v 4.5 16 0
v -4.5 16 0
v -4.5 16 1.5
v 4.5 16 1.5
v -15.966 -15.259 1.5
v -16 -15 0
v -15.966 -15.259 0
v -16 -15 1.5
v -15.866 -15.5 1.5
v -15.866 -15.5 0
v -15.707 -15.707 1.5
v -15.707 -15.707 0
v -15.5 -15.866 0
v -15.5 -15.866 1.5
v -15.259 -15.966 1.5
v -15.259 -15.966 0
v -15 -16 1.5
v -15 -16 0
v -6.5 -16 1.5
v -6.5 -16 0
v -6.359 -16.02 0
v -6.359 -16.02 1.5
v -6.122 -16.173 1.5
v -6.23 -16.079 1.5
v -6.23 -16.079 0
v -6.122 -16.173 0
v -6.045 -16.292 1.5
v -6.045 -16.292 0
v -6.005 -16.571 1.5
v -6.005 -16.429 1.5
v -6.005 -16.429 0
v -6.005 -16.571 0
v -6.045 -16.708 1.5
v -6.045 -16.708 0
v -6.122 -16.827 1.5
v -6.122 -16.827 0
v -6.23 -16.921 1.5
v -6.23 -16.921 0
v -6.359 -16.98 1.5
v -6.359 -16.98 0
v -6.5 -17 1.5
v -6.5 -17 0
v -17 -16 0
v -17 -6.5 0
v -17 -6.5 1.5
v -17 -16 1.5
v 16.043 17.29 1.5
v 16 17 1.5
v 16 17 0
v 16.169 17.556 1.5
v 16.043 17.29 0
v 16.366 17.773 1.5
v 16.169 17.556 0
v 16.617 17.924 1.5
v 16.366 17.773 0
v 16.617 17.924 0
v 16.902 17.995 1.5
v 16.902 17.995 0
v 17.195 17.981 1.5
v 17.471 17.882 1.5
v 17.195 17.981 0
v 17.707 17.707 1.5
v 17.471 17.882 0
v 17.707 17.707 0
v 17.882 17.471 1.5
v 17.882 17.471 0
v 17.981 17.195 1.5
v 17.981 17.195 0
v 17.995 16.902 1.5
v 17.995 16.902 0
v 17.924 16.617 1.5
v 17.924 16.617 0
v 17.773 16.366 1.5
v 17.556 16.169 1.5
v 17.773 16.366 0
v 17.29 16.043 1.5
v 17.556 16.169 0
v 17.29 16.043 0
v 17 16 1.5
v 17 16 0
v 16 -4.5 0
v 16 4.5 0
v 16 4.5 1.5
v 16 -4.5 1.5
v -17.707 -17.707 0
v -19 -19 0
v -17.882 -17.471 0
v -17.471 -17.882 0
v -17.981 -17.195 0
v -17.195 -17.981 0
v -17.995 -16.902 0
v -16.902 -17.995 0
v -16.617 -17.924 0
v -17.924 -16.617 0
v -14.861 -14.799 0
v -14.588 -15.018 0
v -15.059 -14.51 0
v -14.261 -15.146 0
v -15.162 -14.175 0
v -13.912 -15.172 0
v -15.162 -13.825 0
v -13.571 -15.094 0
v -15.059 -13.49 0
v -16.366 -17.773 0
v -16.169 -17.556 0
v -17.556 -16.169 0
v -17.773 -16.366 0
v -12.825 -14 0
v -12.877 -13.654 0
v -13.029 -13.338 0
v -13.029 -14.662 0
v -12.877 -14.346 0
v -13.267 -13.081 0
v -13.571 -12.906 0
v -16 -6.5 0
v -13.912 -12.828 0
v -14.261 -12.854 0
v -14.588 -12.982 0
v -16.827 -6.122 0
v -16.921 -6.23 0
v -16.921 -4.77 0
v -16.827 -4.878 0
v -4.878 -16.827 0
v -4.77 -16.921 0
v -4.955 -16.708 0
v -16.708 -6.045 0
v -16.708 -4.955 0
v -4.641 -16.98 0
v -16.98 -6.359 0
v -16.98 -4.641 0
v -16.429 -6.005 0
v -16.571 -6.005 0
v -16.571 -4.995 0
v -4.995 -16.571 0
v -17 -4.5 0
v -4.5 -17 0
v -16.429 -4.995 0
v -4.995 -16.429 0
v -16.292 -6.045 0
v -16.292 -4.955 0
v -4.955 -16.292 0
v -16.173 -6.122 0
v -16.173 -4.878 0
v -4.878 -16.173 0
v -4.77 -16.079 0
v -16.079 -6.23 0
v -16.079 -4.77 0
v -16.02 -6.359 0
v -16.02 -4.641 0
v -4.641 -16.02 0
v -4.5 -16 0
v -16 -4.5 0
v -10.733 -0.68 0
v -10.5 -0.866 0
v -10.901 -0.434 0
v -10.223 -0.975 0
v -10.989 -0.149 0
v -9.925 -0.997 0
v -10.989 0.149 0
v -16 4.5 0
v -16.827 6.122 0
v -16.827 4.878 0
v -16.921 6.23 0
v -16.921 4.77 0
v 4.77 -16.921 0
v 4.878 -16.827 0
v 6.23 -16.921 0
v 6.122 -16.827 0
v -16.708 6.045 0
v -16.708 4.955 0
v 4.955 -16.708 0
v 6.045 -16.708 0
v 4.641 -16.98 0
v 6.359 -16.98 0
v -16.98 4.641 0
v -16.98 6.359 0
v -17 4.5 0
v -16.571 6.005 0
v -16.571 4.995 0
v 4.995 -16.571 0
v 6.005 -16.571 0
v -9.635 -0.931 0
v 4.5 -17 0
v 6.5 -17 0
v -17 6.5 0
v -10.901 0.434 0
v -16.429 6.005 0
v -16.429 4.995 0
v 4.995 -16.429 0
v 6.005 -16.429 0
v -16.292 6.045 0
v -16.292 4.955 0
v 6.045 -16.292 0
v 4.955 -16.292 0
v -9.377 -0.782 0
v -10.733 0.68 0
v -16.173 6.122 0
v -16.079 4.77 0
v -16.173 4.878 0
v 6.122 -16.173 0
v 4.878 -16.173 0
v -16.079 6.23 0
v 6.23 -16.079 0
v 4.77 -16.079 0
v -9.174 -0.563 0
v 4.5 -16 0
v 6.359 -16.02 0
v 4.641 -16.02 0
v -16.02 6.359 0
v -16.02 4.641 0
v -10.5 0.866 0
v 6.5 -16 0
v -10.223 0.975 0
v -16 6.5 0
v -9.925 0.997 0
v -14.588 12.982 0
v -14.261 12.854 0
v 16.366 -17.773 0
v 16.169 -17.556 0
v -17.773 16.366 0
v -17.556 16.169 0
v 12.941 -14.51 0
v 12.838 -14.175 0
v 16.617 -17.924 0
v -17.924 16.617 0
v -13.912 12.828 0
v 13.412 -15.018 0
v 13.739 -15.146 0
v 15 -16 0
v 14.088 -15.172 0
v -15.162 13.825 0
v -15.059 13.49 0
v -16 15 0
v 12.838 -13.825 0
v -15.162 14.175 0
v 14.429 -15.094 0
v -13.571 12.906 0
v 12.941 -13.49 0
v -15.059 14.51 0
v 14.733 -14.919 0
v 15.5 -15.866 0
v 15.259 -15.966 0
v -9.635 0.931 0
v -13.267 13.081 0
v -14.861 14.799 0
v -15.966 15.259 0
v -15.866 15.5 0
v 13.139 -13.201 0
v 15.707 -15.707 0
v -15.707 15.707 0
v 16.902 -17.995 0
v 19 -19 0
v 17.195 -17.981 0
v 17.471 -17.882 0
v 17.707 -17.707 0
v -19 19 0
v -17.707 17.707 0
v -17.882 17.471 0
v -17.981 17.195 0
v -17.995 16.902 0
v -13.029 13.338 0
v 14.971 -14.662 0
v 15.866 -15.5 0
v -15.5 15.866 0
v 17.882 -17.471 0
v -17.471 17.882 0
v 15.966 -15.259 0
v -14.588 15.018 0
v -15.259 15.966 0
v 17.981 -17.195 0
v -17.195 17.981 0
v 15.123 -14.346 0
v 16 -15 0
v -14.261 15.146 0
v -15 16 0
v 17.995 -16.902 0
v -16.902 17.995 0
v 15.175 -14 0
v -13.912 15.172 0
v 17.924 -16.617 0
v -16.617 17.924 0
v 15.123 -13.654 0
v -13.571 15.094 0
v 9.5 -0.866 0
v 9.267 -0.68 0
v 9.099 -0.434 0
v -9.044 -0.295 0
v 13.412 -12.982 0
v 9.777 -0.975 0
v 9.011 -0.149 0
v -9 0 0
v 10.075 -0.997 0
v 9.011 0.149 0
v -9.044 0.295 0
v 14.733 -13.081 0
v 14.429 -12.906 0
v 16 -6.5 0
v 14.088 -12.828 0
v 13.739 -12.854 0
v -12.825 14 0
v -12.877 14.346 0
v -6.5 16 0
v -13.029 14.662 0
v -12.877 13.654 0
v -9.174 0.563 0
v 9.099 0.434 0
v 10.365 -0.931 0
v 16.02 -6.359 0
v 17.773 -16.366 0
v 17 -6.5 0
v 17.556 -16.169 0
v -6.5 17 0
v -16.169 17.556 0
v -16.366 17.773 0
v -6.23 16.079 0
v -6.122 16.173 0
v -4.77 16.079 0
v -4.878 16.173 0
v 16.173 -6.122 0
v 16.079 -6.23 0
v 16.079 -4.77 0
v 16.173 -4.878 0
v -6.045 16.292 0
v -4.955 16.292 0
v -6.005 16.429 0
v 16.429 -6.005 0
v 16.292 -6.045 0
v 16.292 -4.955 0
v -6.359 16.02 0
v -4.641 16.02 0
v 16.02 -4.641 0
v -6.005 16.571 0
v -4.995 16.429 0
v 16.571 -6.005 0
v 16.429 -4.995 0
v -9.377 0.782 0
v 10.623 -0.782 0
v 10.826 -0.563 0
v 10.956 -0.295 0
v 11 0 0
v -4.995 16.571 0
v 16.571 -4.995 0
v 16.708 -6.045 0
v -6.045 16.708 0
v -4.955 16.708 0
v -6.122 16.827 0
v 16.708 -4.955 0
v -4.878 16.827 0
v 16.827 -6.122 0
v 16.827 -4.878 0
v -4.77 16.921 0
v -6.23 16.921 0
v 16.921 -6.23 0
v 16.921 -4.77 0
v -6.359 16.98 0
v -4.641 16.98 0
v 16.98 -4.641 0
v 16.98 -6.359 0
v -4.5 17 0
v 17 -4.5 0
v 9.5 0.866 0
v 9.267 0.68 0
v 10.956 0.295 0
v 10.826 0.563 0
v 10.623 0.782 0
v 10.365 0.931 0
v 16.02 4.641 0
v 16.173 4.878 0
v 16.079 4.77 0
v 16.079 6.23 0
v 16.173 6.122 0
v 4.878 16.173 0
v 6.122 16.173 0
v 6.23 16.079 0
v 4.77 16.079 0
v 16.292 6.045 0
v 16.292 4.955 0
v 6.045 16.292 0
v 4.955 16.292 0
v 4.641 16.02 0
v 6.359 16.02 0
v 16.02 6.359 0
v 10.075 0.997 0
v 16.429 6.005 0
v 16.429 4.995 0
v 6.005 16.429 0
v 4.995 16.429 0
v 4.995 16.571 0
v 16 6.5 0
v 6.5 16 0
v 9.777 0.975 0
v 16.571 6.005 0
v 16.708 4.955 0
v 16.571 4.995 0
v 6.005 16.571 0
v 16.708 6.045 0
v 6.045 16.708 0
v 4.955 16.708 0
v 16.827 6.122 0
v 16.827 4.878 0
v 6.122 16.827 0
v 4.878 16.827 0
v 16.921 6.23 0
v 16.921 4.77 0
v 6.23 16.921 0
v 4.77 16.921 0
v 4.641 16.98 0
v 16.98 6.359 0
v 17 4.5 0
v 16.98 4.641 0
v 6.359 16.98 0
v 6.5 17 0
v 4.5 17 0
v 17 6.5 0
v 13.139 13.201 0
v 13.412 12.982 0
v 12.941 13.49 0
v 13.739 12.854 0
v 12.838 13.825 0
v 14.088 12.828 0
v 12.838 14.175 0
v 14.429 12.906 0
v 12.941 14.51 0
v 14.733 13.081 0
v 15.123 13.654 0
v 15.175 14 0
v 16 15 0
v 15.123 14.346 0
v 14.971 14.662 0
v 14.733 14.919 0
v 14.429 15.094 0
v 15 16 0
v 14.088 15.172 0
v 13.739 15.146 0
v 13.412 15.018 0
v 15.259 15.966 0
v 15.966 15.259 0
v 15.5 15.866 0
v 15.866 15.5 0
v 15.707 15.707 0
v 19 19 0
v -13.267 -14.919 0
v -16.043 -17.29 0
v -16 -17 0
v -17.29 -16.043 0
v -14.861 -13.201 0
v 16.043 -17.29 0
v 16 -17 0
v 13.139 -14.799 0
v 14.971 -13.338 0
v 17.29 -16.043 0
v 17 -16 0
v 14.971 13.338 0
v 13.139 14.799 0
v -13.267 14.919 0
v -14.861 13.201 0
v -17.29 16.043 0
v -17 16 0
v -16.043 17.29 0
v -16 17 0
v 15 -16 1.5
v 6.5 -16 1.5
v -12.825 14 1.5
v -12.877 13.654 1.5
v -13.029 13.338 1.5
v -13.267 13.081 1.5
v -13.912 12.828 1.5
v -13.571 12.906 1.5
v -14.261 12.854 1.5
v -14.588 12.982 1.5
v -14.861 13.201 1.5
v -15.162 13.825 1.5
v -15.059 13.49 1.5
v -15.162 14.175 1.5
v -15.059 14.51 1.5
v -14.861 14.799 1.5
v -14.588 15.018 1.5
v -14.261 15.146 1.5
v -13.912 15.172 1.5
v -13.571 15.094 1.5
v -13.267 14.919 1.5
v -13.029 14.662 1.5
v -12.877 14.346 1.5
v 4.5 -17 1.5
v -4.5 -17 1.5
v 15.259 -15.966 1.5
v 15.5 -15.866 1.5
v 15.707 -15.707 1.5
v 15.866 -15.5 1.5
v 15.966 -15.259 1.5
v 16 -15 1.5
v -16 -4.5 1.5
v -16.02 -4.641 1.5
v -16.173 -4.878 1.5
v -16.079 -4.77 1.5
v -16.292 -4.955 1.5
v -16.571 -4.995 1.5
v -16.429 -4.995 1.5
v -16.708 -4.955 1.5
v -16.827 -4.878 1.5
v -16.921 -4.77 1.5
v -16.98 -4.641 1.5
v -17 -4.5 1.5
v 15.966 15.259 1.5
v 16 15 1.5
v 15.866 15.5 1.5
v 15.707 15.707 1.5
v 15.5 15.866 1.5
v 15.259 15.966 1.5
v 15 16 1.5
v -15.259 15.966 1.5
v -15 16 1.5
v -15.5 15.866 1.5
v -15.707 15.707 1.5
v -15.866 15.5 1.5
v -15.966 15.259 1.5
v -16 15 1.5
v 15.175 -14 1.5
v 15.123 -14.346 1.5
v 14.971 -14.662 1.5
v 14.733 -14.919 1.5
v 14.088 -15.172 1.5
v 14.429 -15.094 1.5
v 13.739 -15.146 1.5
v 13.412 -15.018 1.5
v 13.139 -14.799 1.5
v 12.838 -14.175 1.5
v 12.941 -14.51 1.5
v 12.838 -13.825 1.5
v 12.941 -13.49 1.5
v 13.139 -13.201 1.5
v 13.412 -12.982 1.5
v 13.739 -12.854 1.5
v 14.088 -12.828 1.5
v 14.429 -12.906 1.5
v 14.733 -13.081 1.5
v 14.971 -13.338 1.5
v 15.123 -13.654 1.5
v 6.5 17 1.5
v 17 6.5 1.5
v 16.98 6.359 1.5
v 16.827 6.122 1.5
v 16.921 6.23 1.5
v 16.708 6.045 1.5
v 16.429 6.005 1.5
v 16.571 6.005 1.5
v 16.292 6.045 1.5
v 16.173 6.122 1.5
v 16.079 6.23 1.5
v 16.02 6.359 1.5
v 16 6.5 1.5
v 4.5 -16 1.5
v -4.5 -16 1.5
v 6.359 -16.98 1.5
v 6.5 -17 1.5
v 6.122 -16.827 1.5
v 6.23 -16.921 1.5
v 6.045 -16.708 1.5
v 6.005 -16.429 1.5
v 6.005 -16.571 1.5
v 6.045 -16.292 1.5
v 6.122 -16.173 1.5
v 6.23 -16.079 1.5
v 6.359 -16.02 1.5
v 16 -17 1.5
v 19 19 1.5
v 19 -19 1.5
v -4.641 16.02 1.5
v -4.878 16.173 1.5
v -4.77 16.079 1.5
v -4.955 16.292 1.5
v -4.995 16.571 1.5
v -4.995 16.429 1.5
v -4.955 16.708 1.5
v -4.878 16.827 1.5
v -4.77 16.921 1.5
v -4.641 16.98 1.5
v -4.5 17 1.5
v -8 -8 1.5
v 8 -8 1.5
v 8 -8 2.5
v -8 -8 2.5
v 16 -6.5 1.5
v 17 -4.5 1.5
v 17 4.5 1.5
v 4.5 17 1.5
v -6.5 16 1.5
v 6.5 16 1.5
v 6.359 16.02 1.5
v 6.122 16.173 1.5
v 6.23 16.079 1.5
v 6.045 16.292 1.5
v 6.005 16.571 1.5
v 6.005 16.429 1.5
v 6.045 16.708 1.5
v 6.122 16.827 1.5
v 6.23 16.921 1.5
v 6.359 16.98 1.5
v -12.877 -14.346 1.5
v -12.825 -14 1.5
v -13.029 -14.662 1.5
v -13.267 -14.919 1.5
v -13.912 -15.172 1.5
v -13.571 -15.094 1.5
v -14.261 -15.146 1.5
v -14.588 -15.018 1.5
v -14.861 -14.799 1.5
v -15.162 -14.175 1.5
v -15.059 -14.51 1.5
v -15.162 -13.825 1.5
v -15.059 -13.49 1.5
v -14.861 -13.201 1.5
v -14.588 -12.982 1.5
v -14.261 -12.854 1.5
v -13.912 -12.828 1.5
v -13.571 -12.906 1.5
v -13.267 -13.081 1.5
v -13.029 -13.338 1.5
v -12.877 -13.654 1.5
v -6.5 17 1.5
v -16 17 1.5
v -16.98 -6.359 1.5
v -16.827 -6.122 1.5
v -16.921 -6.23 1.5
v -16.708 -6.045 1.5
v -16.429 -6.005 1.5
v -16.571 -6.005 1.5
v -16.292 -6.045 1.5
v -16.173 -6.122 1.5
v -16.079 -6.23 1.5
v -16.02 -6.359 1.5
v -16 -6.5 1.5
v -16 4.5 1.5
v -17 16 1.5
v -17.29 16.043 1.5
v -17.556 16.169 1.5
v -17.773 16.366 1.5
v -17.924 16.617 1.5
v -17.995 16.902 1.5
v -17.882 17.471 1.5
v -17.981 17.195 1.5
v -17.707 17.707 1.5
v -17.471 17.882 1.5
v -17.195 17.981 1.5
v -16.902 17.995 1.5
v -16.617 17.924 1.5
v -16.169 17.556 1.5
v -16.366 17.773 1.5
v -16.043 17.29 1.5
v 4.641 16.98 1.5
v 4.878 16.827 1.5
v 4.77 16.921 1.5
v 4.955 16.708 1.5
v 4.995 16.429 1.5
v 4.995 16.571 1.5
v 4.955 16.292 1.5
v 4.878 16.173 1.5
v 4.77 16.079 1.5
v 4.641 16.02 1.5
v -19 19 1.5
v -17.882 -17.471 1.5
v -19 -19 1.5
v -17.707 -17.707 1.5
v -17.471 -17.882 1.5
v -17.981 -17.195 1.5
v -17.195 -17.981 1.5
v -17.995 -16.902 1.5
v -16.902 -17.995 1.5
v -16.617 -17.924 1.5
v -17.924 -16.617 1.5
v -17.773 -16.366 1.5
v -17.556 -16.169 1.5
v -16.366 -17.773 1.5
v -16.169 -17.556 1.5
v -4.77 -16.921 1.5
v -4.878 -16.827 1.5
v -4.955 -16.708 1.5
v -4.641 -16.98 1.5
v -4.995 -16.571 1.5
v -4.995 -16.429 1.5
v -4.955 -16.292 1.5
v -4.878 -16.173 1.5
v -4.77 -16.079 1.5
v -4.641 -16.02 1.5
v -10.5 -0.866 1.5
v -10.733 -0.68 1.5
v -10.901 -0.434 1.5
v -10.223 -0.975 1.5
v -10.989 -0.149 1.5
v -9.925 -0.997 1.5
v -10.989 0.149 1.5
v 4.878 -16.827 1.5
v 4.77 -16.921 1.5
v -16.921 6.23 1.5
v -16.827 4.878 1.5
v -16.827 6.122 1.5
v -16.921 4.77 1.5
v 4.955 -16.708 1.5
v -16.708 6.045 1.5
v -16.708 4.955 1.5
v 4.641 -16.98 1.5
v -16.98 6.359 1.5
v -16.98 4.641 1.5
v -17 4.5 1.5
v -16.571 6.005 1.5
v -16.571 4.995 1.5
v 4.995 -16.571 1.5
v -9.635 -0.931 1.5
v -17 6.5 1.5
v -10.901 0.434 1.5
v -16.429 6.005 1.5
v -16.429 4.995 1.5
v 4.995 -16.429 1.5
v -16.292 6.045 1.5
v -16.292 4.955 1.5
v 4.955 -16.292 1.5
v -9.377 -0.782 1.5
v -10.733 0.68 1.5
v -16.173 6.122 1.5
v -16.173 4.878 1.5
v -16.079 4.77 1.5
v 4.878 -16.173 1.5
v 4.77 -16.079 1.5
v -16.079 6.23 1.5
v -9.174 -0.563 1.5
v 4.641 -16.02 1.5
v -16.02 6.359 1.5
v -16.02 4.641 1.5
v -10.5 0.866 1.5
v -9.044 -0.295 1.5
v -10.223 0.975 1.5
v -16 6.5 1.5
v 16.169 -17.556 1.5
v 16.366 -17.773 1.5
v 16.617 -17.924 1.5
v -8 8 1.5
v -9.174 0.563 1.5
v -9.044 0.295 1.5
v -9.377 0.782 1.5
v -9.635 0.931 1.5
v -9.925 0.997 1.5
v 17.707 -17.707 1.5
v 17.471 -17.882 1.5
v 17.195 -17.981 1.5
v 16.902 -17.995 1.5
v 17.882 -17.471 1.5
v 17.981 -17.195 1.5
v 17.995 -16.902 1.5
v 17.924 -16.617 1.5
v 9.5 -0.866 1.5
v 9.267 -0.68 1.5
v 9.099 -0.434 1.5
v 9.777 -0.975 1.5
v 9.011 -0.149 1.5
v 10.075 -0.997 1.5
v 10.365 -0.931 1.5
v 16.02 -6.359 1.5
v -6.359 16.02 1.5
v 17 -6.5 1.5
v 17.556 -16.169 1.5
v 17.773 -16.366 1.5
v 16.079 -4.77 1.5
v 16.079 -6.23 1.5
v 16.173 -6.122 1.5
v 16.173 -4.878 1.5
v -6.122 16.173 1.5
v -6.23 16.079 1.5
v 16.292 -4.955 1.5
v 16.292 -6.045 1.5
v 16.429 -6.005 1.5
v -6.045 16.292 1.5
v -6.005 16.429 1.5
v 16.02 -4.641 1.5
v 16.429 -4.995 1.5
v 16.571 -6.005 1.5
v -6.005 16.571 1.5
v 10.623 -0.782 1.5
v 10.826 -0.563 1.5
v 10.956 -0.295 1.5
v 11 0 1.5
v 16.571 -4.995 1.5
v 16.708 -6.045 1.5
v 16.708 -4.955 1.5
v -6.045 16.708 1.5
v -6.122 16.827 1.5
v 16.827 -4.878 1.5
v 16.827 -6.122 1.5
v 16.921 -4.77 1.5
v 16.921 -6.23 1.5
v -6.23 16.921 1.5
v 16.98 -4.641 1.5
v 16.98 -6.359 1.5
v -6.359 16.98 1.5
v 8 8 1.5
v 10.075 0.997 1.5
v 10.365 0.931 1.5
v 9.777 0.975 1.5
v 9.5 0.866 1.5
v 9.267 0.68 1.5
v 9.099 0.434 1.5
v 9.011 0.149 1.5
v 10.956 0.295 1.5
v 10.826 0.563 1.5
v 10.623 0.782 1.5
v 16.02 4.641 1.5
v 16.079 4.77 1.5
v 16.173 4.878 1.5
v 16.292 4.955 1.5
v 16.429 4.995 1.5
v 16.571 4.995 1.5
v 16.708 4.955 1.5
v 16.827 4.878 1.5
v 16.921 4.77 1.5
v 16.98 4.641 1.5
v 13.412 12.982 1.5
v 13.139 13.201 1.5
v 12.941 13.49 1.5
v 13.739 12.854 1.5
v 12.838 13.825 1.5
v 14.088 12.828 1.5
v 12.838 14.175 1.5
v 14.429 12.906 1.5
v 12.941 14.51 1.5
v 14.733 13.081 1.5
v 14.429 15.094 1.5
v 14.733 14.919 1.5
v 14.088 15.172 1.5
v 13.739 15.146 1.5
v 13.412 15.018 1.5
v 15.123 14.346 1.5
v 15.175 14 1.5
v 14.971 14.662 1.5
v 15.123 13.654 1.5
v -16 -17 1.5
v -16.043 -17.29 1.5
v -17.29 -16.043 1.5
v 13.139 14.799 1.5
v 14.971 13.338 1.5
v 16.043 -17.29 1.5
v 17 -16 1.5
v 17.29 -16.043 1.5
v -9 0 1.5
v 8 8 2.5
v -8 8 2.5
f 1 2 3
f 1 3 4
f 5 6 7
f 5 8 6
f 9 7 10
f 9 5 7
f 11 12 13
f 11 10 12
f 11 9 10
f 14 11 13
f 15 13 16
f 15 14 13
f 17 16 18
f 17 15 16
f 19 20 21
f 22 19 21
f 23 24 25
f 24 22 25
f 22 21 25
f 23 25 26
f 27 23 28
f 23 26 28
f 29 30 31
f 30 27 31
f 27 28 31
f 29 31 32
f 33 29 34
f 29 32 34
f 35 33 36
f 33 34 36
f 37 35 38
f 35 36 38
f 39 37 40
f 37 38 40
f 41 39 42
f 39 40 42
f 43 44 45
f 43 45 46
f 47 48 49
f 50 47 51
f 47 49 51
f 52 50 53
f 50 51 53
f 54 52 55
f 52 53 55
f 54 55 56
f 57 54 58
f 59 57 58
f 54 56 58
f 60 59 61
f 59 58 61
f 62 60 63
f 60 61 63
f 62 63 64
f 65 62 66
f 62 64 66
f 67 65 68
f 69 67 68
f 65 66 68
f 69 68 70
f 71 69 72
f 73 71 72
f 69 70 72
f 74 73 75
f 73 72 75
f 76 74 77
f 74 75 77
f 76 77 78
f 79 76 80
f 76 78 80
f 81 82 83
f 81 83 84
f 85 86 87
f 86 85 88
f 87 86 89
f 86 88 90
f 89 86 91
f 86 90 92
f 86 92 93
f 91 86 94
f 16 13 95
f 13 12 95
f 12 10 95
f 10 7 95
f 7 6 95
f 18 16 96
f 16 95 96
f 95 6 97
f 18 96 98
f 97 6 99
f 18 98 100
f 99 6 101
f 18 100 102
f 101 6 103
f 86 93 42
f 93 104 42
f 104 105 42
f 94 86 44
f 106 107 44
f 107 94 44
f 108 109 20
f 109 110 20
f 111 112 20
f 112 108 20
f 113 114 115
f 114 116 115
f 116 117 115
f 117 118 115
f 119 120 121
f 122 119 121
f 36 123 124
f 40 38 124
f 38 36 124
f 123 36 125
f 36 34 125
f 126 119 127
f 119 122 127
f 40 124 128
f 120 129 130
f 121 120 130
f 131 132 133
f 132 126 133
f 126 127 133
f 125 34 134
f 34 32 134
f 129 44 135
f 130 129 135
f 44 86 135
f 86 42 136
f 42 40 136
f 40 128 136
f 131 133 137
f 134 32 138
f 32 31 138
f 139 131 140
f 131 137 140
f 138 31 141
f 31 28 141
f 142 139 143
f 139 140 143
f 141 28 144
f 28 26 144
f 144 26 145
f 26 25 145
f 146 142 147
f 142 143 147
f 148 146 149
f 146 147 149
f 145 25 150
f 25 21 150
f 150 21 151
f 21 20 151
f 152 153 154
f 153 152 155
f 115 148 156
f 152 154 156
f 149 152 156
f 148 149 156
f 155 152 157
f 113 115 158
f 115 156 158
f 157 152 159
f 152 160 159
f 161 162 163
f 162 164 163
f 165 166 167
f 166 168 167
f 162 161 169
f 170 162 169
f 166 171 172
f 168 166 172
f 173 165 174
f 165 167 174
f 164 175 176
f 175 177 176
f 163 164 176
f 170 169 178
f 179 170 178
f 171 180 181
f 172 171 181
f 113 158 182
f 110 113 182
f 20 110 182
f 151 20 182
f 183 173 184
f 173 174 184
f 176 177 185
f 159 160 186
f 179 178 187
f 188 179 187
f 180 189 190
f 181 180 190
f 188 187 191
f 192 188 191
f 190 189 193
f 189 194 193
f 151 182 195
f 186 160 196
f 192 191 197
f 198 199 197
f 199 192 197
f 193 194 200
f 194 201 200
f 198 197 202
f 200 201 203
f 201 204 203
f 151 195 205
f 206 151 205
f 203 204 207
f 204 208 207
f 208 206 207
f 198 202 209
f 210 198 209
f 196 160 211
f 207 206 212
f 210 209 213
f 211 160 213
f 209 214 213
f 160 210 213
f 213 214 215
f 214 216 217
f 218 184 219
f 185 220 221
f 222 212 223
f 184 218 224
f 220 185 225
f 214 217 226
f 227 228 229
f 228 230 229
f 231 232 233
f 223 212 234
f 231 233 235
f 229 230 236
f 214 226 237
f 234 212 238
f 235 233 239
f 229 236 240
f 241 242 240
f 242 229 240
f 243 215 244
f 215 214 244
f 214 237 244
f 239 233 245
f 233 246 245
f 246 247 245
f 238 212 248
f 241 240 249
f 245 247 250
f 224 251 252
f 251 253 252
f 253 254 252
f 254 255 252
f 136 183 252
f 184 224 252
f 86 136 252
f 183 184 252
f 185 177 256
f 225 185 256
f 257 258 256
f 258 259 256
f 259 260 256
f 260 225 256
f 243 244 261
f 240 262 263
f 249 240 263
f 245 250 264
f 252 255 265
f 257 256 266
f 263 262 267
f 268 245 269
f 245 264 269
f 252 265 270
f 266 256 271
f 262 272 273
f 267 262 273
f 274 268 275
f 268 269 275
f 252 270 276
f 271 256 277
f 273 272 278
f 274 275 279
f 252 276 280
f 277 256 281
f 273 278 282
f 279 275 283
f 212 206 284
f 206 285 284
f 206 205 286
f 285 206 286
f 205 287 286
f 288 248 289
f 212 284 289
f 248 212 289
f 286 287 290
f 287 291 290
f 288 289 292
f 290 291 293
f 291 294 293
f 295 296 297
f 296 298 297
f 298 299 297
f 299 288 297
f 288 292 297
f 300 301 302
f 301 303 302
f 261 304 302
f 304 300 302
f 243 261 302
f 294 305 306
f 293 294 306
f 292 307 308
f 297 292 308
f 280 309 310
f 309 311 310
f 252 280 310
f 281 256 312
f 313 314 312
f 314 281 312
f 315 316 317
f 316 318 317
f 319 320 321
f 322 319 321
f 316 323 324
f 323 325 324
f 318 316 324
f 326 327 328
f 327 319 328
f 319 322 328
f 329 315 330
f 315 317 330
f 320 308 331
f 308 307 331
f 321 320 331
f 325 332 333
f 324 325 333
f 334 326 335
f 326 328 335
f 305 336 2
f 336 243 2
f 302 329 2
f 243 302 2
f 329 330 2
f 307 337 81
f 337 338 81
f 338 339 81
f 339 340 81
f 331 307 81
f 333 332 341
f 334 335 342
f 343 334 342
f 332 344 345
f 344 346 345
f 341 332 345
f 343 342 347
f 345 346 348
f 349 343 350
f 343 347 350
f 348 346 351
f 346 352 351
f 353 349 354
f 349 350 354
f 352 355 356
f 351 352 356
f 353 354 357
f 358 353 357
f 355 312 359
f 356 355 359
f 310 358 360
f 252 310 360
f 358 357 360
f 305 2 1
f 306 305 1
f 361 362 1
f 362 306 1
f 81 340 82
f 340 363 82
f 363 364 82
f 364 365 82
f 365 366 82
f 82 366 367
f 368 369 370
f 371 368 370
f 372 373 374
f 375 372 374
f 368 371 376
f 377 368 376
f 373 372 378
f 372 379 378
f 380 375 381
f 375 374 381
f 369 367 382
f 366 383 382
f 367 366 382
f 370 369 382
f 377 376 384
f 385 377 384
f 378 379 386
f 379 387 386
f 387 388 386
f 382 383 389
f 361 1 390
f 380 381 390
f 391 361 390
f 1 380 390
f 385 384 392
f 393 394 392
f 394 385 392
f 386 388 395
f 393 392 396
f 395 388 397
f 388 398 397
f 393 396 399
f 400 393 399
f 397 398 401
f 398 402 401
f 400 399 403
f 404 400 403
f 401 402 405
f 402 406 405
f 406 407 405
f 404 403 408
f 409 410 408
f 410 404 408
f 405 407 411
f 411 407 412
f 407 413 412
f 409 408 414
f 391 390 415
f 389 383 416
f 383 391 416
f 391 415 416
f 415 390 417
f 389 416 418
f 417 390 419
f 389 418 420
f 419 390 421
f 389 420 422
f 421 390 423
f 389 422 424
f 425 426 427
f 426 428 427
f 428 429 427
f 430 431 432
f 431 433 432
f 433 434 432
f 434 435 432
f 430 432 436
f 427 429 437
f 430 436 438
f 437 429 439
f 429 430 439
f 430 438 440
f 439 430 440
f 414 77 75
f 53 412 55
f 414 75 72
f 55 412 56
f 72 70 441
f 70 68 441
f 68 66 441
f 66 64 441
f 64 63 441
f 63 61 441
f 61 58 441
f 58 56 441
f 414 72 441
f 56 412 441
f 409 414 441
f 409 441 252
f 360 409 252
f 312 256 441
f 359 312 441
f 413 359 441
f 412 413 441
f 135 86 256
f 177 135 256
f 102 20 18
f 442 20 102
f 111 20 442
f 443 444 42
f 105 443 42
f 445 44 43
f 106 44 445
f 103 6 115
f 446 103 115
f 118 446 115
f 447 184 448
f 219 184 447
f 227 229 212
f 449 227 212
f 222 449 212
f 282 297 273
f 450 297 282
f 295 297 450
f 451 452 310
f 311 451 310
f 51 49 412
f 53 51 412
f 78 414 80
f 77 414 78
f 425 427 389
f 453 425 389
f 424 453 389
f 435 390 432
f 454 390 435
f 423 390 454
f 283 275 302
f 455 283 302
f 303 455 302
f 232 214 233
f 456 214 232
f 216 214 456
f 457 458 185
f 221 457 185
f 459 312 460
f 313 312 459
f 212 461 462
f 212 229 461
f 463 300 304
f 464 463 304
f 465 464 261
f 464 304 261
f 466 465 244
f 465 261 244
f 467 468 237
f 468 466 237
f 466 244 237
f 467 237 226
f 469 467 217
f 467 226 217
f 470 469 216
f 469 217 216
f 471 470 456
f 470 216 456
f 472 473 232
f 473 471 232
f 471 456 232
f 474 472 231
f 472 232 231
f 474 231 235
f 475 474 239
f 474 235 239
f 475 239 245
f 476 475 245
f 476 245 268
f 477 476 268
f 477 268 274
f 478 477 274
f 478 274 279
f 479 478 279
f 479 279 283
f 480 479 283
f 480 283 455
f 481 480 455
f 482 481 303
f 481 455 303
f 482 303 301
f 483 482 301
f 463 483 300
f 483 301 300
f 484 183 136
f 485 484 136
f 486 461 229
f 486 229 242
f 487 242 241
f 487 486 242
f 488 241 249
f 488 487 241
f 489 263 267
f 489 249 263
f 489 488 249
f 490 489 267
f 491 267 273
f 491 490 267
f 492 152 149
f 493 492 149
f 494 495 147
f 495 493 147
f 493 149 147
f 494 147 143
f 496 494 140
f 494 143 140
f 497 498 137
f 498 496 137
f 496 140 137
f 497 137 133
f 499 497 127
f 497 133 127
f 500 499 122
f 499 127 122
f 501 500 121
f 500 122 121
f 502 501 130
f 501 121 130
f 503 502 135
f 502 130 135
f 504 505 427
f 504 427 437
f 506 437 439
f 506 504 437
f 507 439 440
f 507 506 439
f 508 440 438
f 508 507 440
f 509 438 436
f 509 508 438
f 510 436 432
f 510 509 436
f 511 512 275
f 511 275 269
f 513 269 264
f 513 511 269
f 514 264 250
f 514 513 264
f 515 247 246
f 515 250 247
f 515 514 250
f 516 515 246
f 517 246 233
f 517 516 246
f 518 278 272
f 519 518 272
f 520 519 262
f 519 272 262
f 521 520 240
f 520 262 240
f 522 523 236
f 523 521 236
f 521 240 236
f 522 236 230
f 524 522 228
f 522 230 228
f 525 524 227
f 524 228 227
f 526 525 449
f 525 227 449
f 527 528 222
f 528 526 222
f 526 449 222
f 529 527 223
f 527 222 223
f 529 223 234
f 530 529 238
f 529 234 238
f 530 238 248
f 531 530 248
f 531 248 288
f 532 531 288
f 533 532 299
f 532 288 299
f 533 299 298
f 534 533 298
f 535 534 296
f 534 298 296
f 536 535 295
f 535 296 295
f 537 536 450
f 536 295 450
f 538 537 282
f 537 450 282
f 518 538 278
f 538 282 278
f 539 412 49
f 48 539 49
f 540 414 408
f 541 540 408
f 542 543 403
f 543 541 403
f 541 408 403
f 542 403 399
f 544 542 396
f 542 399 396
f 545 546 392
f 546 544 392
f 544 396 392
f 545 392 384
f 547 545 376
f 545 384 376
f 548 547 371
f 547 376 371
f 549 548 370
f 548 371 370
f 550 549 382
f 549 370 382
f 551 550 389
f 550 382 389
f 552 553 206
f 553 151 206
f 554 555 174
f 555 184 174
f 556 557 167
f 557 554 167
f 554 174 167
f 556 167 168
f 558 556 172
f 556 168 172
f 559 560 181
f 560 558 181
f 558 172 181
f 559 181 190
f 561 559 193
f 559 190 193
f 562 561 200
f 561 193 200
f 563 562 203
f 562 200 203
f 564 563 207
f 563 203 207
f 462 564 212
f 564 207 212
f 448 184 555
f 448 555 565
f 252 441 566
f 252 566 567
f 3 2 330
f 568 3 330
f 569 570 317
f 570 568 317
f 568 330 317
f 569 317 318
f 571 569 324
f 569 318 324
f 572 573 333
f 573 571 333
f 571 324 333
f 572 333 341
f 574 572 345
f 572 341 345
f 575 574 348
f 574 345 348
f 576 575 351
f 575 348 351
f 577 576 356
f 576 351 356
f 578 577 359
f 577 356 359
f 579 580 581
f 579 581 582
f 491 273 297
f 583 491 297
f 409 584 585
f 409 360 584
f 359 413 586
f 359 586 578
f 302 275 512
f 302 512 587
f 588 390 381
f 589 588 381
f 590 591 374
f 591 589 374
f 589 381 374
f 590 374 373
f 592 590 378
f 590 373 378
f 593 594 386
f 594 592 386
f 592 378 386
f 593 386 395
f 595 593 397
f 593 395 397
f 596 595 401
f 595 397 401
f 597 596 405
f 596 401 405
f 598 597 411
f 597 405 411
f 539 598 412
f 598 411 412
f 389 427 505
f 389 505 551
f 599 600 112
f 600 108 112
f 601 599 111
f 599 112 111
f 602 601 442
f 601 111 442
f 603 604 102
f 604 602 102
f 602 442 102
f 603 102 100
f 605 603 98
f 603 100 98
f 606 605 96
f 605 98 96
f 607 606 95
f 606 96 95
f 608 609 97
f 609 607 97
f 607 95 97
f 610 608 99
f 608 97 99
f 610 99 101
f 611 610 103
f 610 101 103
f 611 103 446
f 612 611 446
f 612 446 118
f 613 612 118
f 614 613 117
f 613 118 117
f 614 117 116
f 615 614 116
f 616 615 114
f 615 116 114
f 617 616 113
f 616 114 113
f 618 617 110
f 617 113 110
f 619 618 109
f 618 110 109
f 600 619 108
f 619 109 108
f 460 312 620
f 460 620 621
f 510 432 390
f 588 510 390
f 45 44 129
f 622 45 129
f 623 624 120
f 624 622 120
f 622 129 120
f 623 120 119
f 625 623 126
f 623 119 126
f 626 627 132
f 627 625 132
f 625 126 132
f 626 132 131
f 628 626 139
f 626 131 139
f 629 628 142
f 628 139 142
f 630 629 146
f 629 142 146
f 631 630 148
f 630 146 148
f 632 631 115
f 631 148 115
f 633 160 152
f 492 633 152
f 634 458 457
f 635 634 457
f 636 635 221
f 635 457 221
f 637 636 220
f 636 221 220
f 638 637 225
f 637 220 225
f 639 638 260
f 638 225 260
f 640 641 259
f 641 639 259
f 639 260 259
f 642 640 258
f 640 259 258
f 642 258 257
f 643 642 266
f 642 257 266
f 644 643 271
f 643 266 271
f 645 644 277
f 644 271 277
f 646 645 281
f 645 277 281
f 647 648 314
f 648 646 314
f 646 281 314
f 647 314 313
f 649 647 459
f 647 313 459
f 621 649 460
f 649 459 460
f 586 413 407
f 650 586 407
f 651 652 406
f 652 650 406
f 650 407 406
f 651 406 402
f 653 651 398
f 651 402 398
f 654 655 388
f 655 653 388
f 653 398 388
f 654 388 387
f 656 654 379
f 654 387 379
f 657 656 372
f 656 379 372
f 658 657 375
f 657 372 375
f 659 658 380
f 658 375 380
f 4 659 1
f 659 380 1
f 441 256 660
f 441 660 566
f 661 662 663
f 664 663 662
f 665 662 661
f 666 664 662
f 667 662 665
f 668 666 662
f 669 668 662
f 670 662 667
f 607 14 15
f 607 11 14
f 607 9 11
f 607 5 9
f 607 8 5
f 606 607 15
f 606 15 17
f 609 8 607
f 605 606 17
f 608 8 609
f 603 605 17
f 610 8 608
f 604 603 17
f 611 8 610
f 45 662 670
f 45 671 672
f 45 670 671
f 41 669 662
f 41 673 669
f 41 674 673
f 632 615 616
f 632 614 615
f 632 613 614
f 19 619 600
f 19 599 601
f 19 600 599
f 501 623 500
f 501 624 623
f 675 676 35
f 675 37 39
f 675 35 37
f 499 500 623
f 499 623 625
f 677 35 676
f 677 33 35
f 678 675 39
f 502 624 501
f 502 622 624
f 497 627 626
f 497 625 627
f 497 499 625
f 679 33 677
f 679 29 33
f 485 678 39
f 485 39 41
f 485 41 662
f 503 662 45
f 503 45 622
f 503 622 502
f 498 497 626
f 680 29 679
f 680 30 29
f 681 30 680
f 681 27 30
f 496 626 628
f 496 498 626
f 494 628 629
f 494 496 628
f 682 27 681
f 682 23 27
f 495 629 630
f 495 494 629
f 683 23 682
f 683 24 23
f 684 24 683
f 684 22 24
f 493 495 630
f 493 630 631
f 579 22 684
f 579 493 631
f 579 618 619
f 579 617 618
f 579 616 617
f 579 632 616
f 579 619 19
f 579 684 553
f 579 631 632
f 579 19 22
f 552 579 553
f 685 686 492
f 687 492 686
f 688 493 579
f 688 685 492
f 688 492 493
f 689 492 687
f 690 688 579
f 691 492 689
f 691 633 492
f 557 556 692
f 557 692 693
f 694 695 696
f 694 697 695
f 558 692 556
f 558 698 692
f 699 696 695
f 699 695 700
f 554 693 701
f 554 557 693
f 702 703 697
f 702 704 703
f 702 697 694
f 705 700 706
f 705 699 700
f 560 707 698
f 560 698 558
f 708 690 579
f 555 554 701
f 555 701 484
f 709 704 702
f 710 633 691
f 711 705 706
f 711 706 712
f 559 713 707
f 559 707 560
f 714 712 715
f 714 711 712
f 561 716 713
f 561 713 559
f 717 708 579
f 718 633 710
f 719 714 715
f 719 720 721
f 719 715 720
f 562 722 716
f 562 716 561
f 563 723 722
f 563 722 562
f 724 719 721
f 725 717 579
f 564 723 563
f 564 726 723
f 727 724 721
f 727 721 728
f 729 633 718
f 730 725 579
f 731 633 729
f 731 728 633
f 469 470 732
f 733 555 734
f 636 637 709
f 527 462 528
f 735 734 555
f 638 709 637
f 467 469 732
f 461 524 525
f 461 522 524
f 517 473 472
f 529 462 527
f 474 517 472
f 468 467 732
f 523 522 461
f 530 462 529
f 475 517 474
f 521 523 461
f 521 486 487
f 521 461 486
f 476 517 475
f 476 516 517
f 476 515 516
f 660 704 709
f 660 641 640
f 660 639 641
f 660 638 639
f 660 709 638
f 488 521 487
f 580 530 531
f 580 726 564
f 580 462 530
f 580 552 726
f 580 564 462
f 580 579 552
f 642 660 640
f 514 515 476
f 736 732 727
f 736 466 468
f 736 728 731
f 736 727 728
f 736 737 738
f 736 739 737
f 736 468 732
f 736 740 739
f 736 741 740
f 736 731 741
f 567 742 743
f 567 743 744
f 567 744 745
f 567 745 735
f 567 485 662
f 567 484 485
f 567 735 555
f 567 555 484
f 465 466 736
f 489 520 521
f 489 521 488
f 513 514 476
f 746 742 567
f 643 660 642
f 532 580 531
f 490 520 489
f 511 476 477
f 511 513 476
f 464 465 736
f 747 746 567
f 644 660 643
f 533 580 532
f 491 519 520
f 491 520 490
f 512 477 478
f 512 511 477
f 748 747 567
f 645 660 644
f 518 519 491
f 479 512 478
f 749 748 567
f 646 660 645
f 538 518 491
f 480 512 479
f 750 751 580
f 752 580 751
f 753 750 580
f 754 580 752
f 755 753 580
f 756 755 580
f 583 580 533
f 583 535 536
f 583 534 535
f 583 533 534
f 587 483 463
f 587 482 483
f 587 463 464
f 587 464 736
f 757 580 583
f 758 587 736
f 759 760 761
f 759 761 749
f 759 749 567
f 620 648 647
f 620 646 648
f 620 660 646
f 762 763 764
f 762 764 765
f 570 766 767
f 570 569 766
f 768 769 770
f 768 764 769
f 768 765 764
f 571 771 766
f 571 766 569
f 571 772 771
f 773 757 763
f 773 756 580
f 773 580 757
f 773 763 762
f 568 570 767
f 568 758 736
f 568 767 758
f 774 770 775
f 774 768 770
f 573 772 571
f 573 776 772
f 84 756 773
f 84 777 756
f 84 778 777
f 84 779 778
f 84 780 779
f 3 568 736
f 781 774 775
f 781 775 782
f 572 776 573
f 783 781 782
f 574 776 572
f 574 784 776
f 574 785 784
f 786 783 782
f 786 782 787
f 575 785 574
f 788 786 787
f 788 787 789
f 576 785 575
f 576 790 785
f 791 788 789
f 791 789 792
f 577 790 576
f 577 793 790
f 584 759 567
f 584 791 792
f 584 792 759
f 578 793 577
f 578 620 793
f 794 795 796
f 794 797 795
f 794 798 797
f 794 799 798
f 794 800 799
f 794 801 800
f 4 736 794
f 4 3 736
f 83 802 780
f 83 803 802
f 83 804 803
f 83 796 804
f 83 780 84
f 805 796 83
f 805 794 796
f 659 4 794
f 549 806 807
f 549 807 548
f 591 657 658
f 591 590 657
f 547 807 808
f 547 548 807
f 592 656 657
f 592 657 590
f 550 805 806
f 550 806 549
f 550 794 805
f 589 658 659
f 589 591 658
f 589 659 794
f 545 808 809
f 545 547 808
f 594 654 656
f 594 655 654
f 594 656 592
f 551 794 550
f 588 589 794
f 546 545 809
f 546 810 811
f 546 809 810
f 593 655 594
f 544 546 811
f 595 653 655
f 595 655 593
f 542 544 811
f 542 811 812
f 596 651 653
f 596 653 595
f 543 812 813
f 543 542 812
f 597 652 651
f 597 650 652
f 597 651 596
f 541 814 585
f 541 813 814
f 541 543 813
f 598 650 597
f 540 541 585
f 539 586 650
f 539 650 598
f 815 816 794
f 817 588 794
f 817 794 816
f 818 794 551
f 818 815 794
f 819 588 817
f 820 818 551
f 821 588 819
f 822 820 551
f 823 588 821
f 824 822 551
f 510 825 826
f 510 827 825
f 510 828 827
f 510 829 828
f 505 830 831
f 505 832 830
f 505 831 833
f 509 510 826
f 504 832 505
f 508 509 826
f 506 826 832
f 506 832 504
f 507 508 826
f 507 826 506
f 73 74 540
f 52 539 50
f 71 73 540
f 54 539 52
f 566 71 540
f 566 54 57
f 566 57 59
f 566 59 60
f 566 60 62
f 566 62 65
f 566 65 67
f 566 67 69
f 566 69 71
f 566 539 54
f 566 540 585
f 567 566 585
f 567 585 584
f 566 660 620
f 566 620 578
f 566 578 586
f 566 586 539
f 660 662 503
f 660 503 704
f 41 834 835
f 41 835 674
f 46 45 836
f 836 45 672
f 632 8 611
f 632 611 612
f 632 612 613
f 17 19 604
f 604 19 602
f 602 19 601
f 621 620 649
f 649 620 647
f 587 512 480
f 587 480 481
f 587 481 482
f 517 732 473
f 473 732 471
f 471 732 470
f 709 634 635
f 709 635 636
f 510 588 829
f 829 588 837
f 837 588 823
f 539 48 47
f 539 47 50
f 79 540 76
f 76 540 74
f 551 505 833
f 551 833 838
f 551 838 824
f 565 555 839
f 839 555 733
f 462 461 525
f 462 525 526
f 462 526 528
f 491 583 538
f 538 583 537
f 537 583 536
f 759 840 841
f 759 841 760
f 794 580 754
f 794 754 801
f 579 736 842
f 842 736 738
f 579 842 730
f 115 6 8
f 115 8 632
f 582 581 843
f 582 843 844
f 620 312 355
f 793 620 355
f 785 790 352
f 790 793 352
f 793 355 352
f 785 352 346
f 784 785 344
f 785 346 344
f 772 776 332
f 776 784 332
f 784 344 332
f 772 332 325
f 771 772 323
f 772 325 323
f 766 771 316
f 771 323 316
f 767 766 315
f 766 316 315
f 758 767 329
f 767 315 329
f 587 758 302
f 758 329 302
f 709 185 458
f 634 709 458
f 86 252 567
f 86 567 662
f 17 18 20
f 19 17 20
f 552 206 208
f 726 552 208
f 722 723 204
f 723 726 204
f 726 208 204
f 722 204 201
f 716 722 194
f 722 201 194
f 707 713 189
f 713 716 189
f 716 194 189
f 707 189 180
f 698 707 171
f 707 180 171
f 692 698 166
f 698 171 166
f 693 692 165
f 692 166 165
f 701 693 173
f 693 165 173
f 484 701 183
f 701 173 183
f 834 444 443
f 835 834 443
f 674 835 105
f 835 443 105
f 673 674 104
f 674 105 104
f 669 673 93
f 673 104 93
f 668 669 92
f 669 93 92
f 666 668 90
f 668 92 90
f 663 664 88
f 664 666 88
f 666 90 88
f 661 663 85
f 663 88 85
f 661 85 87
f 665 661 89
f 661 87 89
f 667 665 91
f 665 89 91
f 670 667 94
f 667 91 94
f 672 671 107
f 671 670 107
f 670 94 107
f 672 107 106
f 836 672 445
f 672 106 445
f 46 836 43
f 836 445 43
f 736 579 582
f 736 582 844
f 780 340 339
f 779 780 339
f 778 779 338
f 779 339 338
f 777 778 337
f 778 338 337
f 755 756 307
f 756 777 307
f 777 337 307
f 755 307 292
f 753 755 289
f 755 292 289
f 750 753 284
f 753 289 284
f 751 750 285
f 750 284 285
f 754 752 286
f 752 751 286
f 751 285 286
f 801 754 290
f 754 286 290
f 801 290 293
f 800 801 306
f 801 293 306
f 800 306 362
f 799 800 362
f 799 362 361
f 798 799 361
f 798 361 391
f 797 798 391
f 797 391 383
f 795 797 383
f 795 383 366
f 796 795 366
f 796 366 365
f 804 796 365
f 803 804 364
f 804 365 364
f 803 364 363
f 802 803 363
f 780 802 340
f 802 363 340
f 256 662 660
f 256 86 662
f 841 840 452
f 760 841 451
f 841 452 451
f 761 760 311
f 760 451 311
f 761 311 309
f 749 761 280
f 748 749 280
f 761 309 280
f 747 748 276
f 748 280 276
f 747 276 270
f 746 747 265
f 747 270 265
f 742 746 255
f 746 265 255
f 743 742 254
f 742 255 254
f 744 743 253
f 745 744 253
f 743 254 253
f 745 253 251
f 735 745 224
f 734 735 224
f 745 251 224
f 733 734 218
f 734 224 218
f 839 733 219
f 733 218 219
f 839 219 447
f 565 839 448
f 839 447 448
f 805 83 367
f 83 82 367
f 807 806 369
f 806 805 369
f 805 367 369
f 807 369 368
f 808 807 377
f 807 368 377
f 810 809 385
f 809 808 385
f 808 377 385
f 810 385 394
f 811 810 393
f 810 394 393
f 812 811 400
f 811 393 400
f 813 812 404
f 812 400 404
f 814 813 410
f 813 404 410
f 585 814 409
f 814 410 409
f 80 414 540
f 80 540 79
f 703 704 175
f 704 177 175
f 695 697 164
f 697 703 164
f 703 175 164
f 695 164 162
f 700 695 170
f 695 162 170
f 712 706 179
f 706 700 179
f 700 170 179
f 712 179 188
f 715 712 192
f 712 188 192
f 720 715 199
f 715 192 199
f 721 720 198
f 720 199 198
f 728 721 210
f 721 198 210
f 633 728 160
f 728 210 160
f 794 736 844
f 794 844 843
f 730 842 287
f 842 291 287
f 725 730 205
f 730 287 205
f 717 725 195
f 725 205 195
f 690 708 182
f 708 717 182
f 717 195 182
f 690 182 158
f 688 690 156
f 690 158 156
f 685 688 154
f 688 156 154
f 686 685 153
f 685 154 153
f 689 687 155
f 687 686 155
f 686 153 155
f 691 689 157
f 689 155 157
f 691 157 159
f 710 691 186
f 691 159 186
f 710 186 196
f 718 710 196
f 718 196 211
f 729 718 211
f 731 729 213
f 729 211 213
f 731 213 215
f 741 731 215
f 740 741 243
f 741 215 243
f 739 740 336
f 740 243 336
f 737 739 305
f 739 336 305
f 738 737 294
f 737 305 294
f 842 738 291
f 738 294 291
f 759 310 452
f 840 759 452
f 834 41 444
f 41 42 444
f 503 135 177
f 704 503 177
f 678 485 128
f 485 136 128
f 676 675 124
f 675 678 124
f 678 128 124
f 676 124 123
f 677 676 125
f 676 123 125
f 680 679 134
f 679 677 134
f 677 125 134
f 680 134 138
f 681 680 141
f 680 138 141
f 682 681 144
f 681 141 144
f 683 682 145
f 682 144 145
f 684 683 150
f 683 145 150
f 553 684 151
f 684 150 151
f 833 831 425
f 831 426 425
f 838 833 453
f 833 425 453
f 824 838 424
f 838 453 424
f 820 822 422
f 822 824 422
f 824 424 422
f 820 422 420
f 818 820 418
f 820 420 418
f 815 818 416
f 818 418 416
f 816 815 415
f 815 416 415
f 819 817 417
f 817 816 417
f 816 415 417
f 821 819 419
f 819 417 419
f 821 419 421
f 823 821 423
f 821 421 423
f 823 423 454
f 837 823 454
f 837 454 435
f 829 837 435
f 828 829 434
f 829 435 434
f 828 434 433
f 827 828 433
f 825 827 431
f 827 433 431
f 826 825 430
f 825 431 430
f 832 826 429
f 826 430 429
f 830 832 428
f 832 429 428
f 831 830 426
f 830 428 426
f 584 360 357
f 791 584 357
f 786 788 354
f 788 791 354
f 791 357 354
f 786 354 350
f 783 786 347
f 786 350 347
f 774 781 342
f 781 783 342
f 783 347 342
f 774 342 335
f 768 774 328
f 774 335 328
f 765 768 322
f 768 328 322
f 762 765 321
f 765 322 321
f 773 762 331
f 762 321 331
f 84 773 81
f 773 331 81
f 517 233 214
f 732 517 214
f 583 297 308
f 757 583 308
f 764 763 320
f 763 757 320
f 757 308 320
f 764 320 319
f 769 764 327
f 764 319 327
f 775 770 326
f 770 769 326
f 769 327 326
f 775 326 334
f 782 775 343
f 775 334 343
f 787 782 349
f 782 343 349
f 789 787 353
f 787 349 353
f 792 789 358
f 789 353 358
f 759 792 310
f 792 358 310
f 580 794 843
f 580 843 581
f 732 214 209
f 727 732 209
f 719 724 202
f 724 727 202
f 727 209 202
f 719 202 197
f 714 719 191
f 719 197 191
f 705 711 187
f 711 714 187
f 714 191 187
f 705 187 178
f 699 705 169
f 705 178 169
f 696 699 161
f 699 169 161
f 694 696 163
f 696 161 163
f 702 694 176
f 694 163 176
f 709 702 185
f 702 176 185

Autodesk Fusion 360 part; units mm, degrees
sketch "Skizze1" plane through (0, 0, 0) normal (0, 0, 1) x (1, 0, 0)
  line L0 (-19, 19) -> (19, 19)
  line L1 (19, 19) -> (19, -19)
  line L2 (19, -19) -> (-19, -19)
  line L3 (-19, -19) -> (-19, 19)
  circle A0 centre (-14, 14) radius 1.175
  line L4 (0, 19) -> (0, -19) construction
  line L5 (-19, 0) -> (19, 0) construction
  circle A1 centre (14, 14) radius 1.175
  circle A2 centre (-14, -14) radius 1.175
  circle A3 centre (14, -14) radius 1.175
  circle A4 centre (-17, 17) radius 1
  circle A5 centre (17, 17) radius 1
  circle A6 centre (-17, -17) radius 1
  circle A7 centre (17, -17) radius 1
  circle A8 centre (-10, 0) radius 1
  circle A9 centre (10, 0) radius 1
  line L6 (-17, 16.5) -> (-6.5, 16.5) construction
  line L7 (-4.5, 16.5) -> (4.5, 16.5) construction
  line L8 (-4.5, 16) -> (4.5, 16)
  arc A10 (4.5, 16) -> (4.5, 17) centre (4.5, 16.5) ccw
  line L9 (4.5, 17) -> (-4.5, 17)
  arc A11 (-4.5, 17) -> (-4.5, 16) centre (-4.5, 16.5) ccw
  line L10 (-4.5, 16.5) -> (4.5, 16.5) construction
  line L11 (-6.5, 17) -> (-17, 17)
  arc A12 (-17, 17) -> (-17, 16) centre (-17, 16.5) ccw
  line L12 (-17, 16) -> (-6.5, 16)
  arc A13 (-6.5, 16) -> (-6.5, 17) centre (-6.5, 16.5) ccw
  line L13 (-6.5, 16.5) -> (-17, 16.5) construction
  line L14 (-19, 19) -> (19, -19) construction
  line L15 (6.5, 17) -> (17, 17)
  arc A14 (17, 16) -> (17, 17) centre (17, 16.5) ccw
  arc A15 (6.5, 17) -> (6.5, 16) centre (6.5, 16.5) ccw
  line L16 (17, 16) -> (6.5, 16)
  line L17 (-6.5, -17) -> (-17, -17)
  arc A16 (-17, -16) -> (-17, -17) centre (-17, -16.5) ccw
  arc A17 (-6.5, -17) -> (-6.5, -16) centre (-6.5, -16.5) ccw
  line L18 (4.5, -17) -> (-4.5, -17)
  arc A18 (-4.5, -16) -> (-4.5, -17) centre (-4.5, -16.5) ccw
  arc A19 (4.5, -17) -> (4.5, -16) centre (4.5, -16.5) ccw
  arc A20 (6.5, -16) -> (6.5, -17) centre (6.5, -16.5) ccw
  line L19 (6.5, -17) -> (17, -17)
  arc A21 (17, -17) -> (17, -16) centre (17, -16.5) ccw
  line L20 (17, -16) -> (6.5, -16)
  line L21 (-4.5, -16) -> (4.5, -16)
  line L22 (-17, -16) -> (-6.5, -16)
  line L23 (-17, -4.5) -> (-17, 4.5)
  arc A22 (-16, 4.5) -> (-17, 4.5) centre (-16.5, 4.5) ccw
  arc A23 (-17, -4.5) -> (-16, -4.5) centre (-16.5, -4.5) ccw
  line L24 (-16, 4.5) -> (-16, -4.5)
  arc A24 (17, 4.5) -> (16, 4.5) centre (16.5, 4.5) ccw
  line L25 (16, 4.5) -> (16, -4.5)
  arc A25 (16, -4.5) -> (17, -4.5) centre (16.5, -4.5) ccw
  line L26 (17, -4.5) -> (17, 4.5)
  line L27 (-17, 6.5) -> (-17, 17)
  arc A26 (-16, 17) -> (-17, 17) centre (-16.5, 17) ccw
  arc A27 (-17, 6.5) -> (-16, 6.5) centre (-16.5, 6.5) ccw
  line L28 (-16, 17) -> (-16, 6.5)
  arc A28 (-16, -6.5) -> (-17, -6.5) centre (-16.5, -6.5) ccw
  line L29 (-17, -6.5) -> (-17, -17)
  arc A29 (-17, -17) -> (-16, -17) centre (-16.5, -17) ccw
  line L30 (-16, -17) -> (-16, -6.5)
  arc A30 (17, 17) -> (16, 17) centre (16.5, 17) ccw
  line L31 (16, 17) -> (16, 6.5)
  arc A31 (16, 6.5) -> (17, 6.5) centre (16.5, 6.5) ccw
  line L32 (17, 6.5) -> (17, 17)
  line L33 (16, -17) -> (16, -6.5)
  arc A32 (17, -6.5) -> (16, -6.5) centre (16.5, -6.5) ccw
  arc A33 (16, -17) -> (17, -17) centre (16.5, -17) ccw
  line L34 (17, -6.5) -> (17, -17)
  dimension "d1" = 38
  dimension "d2" = 38
  dimension "d3" = 2.35
  dimension "d6" = 28
  dimension "d7" = 28
  dimension "d8" = 2
  dimension "d9" = 34
  dimension "d10" = 34
  dimension "d17" = 2
  dimension "d18" = 20
  dimension "d20" = 9
  dimension "d21" = 1
  dimension "d22" = 2
  dimension "d23" = 2.5
  dimension "d24" = 1
  dimension "d25" = 2
extrude "Extrusion1" add sketch "Skizze1" along normal blind 1.5
fillet "Abrundung1" radius 1 4 edges at (-16, -16, 0.75) (16, -16, 0.75) (16, 16, 0.75) (-16, 16, 0.75)
sketch "Skizze2" plane through (0, 0, 1.5) normal (0, 0, 1) x (-1, 0, 0)
  circle A0 centre (14, -14) radius 1.175
  circle A1 centre (-14, 14) radius 1.175
  circle A2 centre (14, 14) radius 1.175
  circle A3 centre (-14, -14) radius 1.175
  line L0 (19, 19) -> (-19, 19)
  line L1 (-19, 19) -> (-19, -19)
  line L2 (-19, -19) -> (19, -19)
  line L3 (19, -19) -> (19, 19)
  line L4 (8, -8) -> (-8, -8)
  line L5 (-8, -8) -> (-8, 8)
  line L6 (-8, 8) -> (8, 8)
  line L7 (8, 8) -> (8, -8)
  line L8 (0, -19) -> (0, 19) construction
  line L9 (19, 0) -> (-19, 0) construction
  circle A4 centre (10, 0) radius 1
  circle A5 centre (-10, 0) radius 1
  line L10 (-17, -4.5) -> (-17, 4.5)
  arc A6 (-16, 4.5) -> (-17, 4.5) centre (-16.5, 4.5) ccw
  line L11 (-16, 4.5) -> (-16, -4.5)
  arc A7 (-17, -4.5) -> (-16, -4.5) centre (-16.5, -4.5) ccw
  line L12 (-6.5, 16) -> (-15, 16)
  line L13 (-16, 15) -> (-16, 6.5)
  arc A8 (-17, 6.5) -> (-16, 6.5) centre (-16.5, 6.5) ccw
  line L14 (-17, 6.5) -> (-17, 16)
  arc A9 (-16, 17) -> (-17, 16) centre (-17, 17) ccw
  line L15 (-16, 17) -> (-6.5, 17)
  arc A10 (-6.5, 16) -> (-6.5, 17) centre (-6.5, 16.5) ccw
  arc A11 (-4.5, 17) -> (-4.5, 16) centre (-4.5, 16.5) ccw
  line L16 (-4.5, 17) -> (4.5, 17)
  arc A12 (4.5, 16) -> (4.5, 17) centre (4.5, 16.5) ccw
  line L17 (4.5, 16) -> (-4.5, 16)
  line L18 (-16, -6.5) -> (-16, -15)
  line L19 (-15, -16) -> (-6.5, -16)
  arc A13 (-6.5, -17) -> (-6.5, -16) centre (-6.5, -16.5) ccw
  line L20 (-6.5, -17) -> (-16, -17)
  arc A14 (-17, -16) -> (-16, -17) centre (-17, -17) ccw
  line L21 (-17, -16) -> (-17, -6.5)
  arc A15 (-16, -6.5) -> (-17, -6.5) centre (-16.5, -6.5) ccw
  line L22 (16, 6.5) -> (16, 15)
  line L23 (15, 16) -> (6.5, 16)
  arc A16 (6.5, 17) -> (6.5, 16) centre (6.5, 16.5) ccw
  line L24 (6.5, 17) -> (16, 17)
  arc A17 (17, 16) -> (16, 17) centre (17, 17) ccw
  line L25 (17, 16) -> (17, 6.5)
  arc A18 (16, 6.5) -> (17, 6.5) centre (16.5, 6.5) ccw
  arc A19 (17, 4.5) -> (16, 4.5) centre (16.5, 4.5) ccw
  line L26 (17, 4.5) -> (17, -4.5)
  arc A20 (16, -4.5) -> (17, -4.5) centre (16.5, -4.5) ccw
  line L27 (16, -4.5) -> (16, 4.5)
  arc A21 (4.5, -17) -> (4.5, -16) centre (4.5, -16.5) ccw
  line L28 (4.5, -17) -> (-4.5, -17)
  arc A22 (-4.5, -16) -> (-4.5, -17) centre (-4.5, -16.5) ccw
  line L29 (-4.5, -16) -> (4.5, -16)
  line L30 (6.5, -16) -> (15, -16)
  line L31 (16, -15) -> (16, -6.5)
  arc A23 (17, -6.5) -> (16, -6.5) centre (16.5, -6.5) ccw
  line L32 (17, -6.5) -> (17, -16)
  arc A24 (16, -17) -> (17, -16) centre (17, -17) ccw
  line L33 (16, -17) -> (6.5, -17)
  arc A25 (6.5, -16) -> (6.5, -17) centre (6.5, -16.5) ccw
  arc A26 (15, -16) -> (16, -15) centre (15, -15) ccw
  arc A27 (-16, -15) -> (-15, -16) centre (-15, -15) ccw
  arc A28 (-15, 16) -> (-16, 15) centre (-15, 15) ccw
  arc A29 (16, 15) -> (15, 16) centre (15, 15) ccw
  dimension "d13" = 16
  dimension "d14" = 16
extrude "Extrusion2" add sketch "Skizze2" along normal blind 1 contours L4 L5 L6 L7
sketch "Skizze3" plane through (0, 0, 0) normal (0, 0, -1) x (1, 0, 0)
  circle A0 centre (-14, 14) radius 1.175
  arc A1 (-4.5, -16) -> (-4.5, -17) centre (-4.5, -16.5) ccw
  line L0 (-4.5, -16) -> (4.5, -16)
  arc A2 (4.5, -17) -> (4.5, -16) centre (4.5, -16.5) ccw
  line L1 (4.5, -17) -> (-4.5, -17)
  circle A3 centre (-14, -14) radius 1.175
  circle A4 centre (14, -14) radius 1.175
  line L2 (-16, 15) -> (-16, 6.5)
  arc A5 (-17, 6.5) -> (-16, 6.5) centre (-16.5, 6.5) ccw
  line L3 (-17, 6.5) -> (-17, 16)
  arc A6 (-16, 17) -> (-17, 16) centre (-17, 17) ccw
  line L4 (-16, 17) -> (-6.5, 17)
  arc A7 (-6.5, 16) -> (-6.5, 17) centre (-6.5, 16.5) ccw
  line L5 (-6.5, 16) -> (-15, 16)
  circle A8 centre (-10, 0) radius 1
  line L6 (-15, -16) -> (-6.5, -16)
  arc A9 (-6.5, -17) -> (-6.5, -16) centre (-6.5, -16.5) ccw
  line L7 (-6.5, -17) -> (-16, -17)
  arc A10 (-17, -16) -> (-16, -17) centre (-17, -17) ccw
  line L8 (-17, -16) -> (-17, -6.5)
  arc A11 (-16, -6.5) -> (-17, -6.5) centre (-16.5, -6.5) ccw
  line L9 (-16, -6.5) -> (-16, -15)
  arc A12 (-16, 4.5) -> (-17, 4.5) centre (-16.5, 4.5) ccw
  line L10 (-16, 4.5) -> (-16, -4.5)
  arc A13 (-17, -4.5) -> (-16, -4.5) centre (-16.5, -4.5) ccw
  line L11 (-17, -4.5) -> (-17, 4.5)
  line L12 (15, 16) -> (6.5, 16)
  arc A14 (6.5, 17) -> (6.5, 16) centre (6.5, 16.5) ccw
  line L13 (6.5, 17) -> (16, 17)
  arc A15 (17, 16) -> (16, 17) centre (17, 17) ccw
  line L14 (17, 16) -> (17, 6.5)
  arc A16 (16, 6.5) -> (17, 6.5) centre (16.5, 6.5) ccw
  line L15 (16, 6.5) -> (16, 15)
  line L16 (16, -15) -> (16, -6.5)
  arc A17 (17, -6.5) -> (16, -6.5) centre (16.5, -6.5) ccw
  line L17 (17, -6.5) -> (17, -16)
  arc A18 (16, -17) -> (17, -16) centre (17, -17) ccw
  line L18 (16, -17) -> (6.5, -17)
  arc A19 (6.5, -16) -> (6.5, -17) centre (6.5, -16.5) ccw
  line L19 (6.5, -16) -> (15, -16)
  arc A20 (4.5, 16) -> (4.5, 17) centre (4.5, 16.5) ccw
  line L20 (4.5, 16) -> (-4.5, 16)
  arc A21 (-4.5, 17) -> (-4.5, 16) centre (-4.5, 16.5) ccw
  line L21 (-4.5, 17) -> (4.5, 17)
  circle A22 centre (14, 14) radius 1.175
  line L22 (17, 4.5) -> (17, -4.5)
  arc A23 (16, -4.5) -> (17, -4.5) centre (16.5, -4.5) ccw
  line L23 (16, -4.5) -> (16, 4.5)
  arc A24 (17, 4.5) -> (16, 4.5) centre (16.5, 4.5) ccw
  circle A25 centre (10, 0) radius 1
  line L24 (19, 19) -> (-19, 19)
  line L25 (-19, 19) -> (-19, -19)
  line L26 (-19, -19) -> (19, -19)
  line L27 (19, -19) -> (19, 19)
  arc A26 (-15, 16) -> (-16, 15) centre (-15, 15) ccw
  arc A27 (-16, -15) -> (-15, -16) centre (-15, -15) ccw
  arc A28 (16, 15) -> (15, 16) centre (15, 15) ccw
  arc A29 (15, -16) -> (16, -15) centre (15, -15) ccw
